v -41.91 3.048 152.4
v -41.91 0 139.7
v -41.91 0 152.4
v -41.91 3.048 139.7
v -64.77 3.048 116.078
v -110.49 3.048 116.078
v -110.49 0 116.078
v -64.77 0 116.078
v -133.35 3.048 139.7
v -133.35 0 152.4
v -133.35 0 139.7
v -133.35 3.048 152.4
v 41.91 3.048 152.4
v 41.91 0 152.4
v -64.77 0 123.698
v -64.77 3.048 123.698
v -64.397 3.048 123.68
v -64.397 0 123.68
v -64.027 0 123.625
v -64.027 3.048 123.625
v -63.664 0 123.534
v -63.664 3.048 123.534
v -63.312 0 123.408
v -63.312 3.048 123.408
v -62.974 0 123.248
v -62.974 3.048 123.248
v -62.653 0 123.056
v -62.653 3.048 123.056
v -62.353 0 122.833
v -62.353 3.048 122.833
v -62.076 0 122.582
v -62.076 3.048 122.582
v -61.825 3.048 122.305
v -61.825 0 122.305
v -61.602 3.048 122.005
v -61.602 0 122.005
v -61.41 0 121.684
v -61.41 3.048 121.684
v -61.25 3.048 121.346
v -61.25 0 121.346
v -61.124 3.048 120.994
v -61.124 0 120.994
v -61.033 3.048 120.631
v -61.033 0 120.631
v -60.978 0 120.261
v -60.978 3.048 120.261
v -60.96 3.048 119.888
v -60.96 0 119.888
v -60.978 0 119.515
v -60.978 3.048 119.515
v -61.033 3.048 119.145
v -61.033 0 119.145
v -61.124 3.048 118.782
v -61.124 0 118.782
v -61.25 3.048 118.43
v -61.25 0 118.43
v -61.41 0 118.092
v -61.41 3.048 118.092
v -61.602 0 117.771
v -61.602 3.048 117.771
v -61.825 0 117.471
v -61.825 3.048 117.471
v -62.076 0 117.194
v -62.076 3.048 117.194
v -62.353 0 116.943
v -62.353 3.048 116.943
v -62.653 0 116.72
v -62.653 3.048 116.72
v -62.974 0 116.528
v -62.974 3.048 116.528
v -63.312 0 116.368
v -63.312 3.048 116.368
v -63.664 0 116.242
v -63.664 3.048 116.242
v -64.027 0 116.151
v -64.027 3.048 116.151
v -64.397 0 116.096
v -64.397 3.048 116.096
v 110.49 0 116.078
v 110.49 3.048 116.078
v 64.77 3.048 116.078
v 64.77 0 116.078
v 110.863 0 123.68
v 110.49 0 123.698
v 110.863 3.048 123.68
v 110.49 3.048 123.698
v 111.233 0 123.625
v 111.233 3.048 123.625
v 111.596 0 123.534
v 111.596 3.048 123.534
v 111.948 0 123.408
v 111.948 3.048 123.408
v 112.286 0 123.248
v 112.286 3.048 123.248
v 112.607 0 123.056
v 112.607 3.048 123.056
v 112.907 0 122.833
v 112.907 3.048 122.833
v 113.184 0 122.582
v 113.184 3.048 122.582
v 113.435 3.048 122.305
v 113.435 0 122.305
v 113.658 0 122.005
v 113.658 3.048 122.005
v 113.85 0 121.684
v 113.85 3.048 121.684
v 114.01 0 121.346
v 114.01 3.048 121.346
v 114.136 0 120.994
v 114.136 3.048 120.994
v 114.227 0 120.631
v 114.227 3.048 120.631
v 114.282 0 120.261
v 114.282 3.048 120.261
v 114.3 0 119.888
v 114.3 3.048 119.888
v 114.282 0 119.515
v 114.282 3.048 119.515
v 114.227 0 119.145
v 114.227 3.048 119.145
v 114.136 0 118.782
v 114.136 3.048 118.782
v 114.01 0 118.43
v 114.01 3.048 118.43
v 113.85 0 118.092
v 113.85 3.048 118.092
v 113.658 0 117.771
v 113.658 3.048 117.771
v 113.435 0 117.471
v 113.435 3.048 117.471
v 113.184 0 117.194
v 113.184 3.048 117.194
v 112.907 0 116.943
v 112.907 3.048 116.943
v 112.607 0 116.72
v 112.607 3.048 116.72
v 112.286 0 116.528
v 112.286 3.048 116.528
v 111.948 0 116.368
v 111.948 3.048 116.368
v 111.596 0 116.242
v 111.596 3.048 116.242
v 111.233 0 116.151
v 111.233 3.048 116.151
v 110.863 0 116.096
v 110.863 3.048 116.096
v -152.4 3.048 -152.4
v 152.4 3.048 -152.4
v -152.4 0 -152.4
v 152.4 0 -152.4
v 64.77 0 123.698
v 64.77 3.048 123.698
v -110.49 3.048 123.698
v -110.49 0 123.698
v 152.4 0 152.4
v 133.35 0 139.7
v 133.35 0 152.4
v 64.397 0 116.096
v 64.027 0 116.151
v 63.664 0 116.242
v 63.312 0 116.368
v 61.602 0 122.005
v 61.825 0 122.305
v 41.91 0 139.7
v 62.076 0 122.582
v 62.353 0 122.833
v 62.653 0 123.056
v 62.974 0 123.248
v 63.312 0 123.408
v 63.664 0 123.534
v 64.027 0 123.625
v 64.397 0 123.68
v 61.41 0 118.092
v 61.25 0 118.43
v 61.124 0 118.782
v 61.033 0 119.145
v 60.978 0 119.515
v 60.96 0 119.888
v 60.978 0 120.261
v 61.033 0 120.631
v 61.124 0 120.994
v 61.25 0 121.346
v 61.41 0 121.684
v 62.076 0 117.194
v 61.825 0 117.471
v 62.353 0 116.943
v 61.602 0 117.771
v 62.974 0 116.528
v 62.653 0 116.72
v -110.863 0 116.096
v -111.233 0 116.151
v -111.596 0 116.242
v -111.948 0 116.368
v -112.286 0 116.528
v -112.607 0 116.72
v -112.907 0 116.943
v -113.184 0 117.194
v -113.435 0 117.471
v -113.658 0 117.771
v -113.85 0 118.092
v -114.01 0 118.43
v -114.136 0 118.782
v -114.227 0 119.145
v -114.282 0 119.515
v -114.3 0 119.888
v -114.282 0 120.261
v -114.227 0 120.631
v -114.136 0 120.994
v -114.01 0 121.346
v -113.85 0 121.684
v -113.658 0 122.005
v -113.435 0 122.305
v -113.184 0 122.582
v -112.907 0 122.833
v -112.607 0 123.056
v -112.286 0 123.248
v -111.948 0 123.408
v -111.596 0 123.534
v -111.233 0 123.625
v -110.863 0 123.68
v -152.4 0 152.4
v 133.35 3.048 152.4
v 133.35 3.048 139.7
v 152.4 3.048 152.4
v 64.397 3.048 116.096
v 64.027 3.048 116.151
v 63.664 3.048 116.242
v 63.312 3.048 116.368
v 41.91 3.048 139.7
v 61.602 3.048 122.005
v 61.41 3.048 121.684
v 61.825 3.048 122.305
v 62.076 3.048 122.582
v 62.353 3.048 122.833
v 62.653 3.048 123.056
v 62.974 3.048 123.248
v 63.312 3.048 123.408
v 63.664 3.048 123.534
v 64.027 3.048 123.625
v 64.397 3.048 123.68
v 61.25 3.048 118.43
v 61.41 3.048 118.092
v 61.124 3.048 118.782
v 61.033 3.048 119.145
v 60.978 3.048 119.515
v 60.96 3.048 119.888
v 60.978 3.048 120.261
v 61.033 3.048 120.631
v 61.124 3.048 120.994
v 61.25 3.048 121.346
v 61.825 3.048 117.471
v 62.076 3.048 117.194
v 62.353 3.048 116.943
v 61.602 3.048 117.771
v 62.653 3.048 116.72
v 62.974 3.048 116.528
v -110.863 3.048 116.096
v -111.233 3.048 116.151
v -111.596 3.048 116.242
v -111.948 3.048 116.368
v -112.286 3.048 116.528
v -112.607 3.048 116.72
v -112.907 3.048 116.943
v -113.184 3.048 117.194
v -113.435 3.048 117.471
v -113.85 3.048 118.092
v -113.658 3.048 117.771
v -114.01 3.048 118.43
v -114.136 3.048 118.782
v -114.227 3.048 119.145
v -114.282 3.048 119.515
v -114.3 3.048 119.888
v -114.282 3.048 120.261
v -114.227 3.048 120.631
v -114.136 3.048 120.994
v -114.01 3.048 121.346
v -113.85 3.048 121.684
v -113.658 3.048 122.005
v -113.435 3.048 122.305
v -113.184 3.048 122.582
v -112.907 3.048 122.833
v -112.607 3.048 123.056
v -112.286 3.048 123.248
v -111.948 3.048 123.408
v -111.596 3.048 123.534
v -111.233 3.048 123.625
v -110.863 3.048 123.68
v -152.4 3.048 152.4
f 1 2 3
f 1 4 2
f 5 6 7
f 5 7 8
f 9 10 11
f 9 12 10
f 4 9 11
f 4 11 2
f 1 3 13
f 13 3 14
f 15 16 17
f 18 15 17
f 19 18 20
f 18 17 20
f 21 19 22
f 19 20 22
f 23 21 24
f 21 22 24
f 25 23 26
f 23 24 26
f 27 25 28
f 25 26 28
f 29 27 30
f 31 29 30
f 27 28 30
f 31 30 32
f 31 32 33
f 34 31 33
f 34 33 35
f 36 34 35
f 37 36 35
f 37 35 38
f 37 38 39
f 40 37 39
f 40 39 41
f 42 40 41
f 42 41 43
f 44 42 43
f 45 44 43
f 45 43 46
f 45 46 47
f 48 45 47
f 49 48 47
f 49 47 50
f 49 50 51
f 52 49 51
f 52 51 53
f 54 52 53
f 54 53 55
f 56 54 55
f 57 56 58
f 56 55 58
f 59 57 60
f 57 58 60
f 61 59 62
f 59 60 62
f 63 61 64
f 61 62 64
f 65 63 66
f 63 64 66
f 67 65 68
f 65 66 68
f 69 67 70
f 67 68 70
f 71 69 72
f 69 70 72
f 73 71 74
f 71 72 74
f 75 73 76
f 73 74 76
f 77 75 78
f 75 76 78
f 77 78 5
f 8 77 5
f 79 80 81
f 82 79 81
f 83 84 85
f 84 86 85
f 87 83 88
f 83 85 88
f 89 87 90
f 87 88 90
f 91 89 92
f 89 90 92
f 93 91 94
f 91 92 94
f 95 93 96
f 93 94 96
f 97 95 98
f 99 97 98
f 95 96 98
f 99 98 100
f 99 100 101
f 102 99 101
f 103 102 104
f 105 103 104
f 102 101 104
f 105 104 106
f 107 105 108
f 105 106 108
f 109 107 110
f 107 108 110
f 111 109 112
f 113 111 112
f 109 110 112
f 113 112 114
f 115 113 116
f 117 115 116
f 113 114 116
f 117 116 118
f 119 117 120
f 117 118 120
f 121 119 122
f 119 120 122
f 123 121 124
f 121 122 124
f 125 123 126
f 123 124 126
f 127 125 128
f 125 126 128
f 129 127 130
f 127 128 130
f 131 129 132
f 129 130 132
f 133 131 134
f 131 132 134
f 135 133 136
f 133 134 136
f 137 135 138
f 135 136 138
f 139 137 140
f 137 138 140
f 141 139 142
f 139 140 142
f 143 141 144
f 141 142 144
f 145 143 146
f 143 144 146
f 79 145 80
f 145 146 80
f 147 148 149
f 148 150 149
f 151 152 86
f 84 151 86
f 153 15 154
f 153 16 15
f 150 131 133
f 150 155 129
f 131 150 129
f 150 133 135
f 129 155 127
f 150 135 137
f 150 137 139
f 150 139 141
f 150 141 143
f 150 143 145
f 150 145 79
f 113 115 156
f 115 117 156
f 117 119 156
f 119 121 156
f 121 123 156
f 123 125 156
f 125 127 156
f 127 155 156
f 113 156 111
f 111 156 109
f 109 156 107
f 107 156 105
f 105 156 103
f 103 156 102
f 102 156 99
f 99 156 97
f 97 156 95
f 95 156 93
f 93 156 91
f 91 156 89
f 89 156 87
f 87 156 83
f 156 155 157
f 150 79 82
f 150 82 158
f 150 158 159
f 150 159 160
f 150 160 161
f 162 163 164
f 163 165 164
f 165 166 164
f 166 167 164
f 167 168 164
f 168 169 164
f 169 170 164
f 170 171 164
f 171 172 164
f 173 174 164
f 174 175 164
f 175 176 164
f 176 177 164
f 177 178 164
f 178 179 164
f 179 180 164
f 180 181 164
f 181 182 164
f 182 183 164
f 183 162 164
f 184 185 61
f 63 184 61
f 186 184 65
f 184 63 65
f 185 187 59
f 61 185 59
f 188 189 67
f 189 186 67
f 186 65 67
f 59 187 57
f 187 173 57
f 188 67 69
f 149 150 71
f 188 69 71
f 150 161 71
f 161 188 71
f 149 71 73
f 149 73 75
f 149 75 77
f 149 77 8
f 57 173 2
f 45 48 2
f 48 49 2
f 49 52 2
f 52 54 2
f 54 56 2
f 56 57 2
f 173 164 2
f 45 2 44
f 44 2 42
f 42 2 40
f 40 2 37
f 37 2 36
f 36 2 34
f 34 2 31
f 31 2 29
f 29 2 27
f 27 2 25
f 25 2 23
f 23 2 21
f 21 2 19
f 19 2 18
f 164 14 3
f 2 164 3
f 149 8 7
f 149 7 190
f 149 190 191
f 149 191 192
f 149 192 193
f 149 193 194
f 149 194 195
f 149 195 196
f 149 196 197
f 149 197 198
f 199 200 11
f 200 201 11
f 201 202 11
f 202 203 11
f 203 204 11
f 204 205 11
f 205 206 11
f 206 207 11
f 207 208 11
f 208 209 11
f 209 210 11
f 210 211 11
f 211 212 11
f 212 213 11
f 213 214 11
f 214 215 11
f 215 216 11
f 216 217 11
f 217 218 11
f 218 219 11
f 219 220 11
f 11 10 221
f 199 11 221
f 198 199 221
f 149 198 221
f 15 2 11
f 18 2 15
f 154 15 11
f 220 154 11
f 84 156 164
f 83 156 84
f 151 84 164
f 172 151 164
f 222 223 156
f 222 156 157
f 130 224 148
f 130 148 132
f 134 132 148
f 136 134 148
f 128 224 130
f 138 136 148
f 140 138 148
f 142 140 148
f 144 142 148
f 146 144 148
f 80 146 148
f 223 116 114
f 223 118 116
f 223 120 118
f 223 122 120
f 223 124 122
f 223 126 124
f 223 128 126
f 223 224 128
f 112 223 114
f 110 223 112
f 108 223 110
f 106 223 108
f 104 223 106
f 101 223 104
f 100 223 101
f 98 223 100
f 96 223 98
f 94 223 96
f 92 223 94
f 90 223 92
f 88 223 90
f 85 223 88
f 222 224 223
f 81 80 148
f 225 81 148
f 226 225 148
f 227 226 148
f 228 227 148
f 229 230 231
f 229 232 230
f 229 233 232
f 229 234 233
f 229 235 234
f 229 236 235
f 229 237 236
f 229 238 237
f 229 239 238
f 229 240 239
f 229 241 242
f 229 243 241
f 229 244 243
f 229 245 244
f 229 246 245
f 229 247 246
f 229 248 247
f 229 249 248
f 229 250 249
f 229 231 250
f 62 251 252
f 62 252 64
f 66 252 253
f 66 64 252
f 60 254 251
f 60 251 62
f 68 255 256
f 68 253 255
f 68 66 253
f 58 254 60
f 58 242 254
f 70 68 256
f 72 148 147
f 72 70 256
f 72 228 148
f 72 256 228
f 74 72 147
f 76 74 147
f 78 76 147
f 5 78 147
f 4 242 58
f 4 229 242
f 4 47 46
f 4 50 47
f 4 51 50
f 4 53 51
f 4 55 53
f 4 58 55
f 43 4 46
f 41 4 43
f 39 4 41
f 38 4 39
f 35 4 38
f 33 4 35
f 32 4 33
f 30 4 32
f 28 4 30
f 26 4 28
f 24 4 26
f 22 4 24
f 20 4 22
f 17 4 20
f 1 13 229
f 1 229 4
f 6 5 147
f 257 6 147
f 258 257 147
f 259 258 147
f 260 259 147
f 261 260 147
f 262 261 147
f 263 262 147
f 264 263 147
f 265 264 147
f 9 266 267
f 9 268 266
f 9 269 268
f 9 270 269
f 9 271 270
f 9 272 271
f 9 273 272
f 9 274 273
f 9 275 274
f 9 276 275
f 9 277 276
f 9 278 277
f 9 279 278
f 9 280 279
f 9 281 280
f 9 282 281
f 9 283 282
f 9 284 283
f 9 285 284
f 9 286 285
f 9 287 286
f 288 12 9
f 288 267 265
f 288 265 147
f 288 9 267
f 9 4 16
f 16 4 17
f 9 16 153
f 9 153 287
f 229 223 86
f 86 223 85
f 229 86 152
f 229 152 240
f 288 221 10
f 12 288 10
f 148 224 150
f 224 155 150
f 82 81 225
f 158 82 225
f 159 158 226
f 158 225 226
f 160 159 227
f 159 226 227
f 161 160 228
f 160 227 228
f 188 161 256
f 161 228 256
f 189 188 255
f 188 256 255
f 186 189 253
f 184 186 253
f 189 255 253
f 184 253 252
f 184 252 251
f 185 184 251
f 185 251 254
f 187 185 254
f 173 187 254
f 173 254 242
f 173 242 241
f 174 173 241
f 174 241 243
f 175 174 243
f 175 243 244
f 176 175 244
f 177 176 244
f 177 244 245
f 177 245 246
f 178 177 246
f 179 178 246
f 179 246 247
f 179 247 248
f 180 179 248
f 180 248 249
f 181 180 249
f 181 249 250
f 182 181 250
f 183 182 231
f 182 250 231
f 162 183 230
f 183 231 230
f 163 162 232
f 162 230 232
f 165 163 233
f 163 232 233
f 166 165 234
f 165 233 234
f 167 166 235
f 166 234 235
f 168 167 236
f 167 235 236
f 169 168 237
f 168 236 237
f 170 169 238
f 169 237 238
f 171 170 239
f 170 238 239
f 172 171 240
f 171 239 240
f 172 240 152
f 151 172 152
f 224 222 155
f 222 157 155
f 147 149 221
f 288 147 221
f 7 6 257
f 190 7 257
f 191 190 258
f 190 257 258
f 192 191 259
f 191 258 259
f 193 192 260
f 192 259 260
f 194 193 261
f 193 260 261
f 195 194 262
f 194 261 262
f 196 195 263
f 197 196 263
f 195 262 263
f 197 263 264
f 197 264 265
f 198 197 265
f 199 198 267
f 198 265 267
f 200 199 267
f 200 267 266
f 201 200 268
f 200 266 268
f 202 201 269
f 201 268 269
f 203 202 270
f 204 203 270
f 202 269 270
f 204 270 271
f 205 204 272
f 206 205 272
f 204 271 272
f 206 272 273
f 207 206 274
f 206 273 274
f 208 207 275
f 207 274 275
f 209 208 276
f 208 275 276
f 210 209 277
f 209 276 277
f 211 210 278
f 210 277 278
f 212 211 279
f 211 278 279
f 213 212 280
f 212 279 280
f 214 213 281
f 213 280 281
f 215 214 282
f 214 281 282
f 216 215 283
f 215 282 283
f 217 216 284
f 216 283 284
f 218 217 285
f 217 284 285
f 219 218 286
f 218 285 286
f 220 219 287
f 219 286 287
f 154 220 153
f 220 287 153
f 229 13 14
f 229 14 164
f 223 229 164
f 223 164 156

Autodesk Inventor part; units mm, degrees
ref_plane "YZ Plane" through (0, 0, 0) normal (1, 0, 0) x (0, 1, 0)
ref_plane "XZ Plane" through (0, 0, 0) normal (0, 1, 0) x (-1, 0, 0)
ref_plane "XY Plane" through (0, 0, 0) normal (0, 0, 1) x (1, 0, 0)
sketch "Sketch1" plane through (0, 0, 0) normal (0, 1, 0) x (-1, 0, 0)
  line L0 (152.4, 152.4) -> (-152.4, 152.4)
  line L1 (-152.4, 152.4) -> (-152.4, -152.4)
  line L2 (-152.4, -152.4) -> (152.4, -152.4)
  line L3 (152.4, -152.4) -> (152.4, 152.4)
  line L4 (152.4, 152.4) -> (-152.4, -152.4) construction
  line L5 (-152.4, 152.4) -> (152.4, -152.4) construction
  point P0 (0, 0)
  dimension "d0" = 304.8
  dimension "d1" = 304.8
extrude "Plate1" add sketch "Sketch1" along normal blind 3.048
sketch "Sketch2" plane through (0, 3.048, 0) normal (0, 1, 0) x (1, 0, 0)
  line L0 (-152.4, -152.4) -> (152.4, -152.4) projected
  line L1 (-133.35, -139.7) -> (-41.91, -139.7)
  line L2 (-41.91, -139.7) -> (-41.91, -165.1)
  line L3 (-41.91, -165.1) -> (-133.35, -165.1)
  line L4 (-133.35, -165.1) -> (-133.35, -139.7)
  line L5 (-133.35, -139.7) -> (-41.91, -165.1) construction
  line L6 (-41.91, -139.7) -> (-133.35, -165.1) construction
  line L7 (41.91, -139.7) -> (133.35, -139.7)
  line L8 (133.35, -139.7) -> (133.35, -165.1)
  line L9 (133.35, -165.1) -> (41.91, -165.1)
  line L10 (41.91, -165.1) -> (41.91, -139.7)
  line L11 (41.91, -139.7) -> (133.35, -165.1) construction
  line L12 (133.35, -139.7) -> (41.91, -165.1) construction
  line L13 (-152.4, -152.4) -> (-152.4, 152.4) projected
  line L14 (152.4, 152.4) -> (152.4, -152.4) projected
  point P0 (0, 0)
  point P1 (-87.63, -152.4)
  point P2 (87.63, -152.4)
  dimension "d7" = 91.44
  dimension "d8" = 25.4
  dimension "d9" = 91.44
  dimension "d10" = 25.4
  dimension "d11" = 19.05
  dimension "d12" = 19.05
extrude "Cut1" cut sketch "Sketch2" against normal blind 3.048
sketch "Sketch3" plane through (0, 3.048, 0) normal (0, 1, 0) x (1, 0, 0)
  line L0 (-110.49, -119.888) -> (-64.77, -119.888) construction
  line L1 (-110.49, -116.078) -> (-64.77, -116.078)
  line L2 (-64.77, -123.698) -> (-110.49, -123.698)
  arc A0 (-110.49, -116.078) -> (-110.49, -123.698) centre (-110.49, -119.888) ccw
  arc A1 (-64.77, -123.698) -> (-64.77, -116.078) centre (-64.77, -119.888) ccw
  line L3 (-152.4, -152.4) -> (-152.4, 152.4) projected
  line L4 (-133.35, -139.7) -> (-41.91, -139.7) projected
  line L5 (-41.91, -152.4) -> (41.91, -152.4) construction
  line L6 (0, -152.4) -> (0, 0) construction
  line L7 (110.49, -119.888) -> (64.77, -119.888) construction
  line L8 (110.49, -116.078) -> (64.77, -116.078)
  line L9 (64.77, -123.698) -> (110.49, -123.698)
  arc A2 (110.49, -123.698) -> (110.49, -116.078) centre (110.49, -119.888) ccw
  arc A3 (64.77, -116.078) -> (64.77, -123.698) centre (64.77, -119.888) ccw
  point P0 (-87.63, -119.888)
  point P1 (87.63, -119.888)
  dimension "d13" = 41.91
  dimension "d14" = 45.72
  dimension "d15" = 3.81
  dimension "d16" = 19.812
extrude "Cut2" cut sketch "Sketch3" against normal blind 3.048
equation "\"d5\" = Thickness"
equation "\"d17\" = Thickness"
equation "\"d2\" = Thickness"
equation "\"BendRadius\" = Thickness"
equation "\"BendReliefWidth\" = Thickness"
equation "\"BendReliefDepth\" = 0.5 * Thickness"
equation "\"CornerReliefSize\" = 4 * Thickness"
equation "\"MinimumRemnant\" = 2 * Thickness"
equation "\"TransitionRadius\" = BendRadius"
equation "\"JacobiRadiusSize\" = BendRadius"
equation "\"GapSize\" = Thickness"
equation "\"Thickness\" = 3.048"
properties part number "FreePanel"
